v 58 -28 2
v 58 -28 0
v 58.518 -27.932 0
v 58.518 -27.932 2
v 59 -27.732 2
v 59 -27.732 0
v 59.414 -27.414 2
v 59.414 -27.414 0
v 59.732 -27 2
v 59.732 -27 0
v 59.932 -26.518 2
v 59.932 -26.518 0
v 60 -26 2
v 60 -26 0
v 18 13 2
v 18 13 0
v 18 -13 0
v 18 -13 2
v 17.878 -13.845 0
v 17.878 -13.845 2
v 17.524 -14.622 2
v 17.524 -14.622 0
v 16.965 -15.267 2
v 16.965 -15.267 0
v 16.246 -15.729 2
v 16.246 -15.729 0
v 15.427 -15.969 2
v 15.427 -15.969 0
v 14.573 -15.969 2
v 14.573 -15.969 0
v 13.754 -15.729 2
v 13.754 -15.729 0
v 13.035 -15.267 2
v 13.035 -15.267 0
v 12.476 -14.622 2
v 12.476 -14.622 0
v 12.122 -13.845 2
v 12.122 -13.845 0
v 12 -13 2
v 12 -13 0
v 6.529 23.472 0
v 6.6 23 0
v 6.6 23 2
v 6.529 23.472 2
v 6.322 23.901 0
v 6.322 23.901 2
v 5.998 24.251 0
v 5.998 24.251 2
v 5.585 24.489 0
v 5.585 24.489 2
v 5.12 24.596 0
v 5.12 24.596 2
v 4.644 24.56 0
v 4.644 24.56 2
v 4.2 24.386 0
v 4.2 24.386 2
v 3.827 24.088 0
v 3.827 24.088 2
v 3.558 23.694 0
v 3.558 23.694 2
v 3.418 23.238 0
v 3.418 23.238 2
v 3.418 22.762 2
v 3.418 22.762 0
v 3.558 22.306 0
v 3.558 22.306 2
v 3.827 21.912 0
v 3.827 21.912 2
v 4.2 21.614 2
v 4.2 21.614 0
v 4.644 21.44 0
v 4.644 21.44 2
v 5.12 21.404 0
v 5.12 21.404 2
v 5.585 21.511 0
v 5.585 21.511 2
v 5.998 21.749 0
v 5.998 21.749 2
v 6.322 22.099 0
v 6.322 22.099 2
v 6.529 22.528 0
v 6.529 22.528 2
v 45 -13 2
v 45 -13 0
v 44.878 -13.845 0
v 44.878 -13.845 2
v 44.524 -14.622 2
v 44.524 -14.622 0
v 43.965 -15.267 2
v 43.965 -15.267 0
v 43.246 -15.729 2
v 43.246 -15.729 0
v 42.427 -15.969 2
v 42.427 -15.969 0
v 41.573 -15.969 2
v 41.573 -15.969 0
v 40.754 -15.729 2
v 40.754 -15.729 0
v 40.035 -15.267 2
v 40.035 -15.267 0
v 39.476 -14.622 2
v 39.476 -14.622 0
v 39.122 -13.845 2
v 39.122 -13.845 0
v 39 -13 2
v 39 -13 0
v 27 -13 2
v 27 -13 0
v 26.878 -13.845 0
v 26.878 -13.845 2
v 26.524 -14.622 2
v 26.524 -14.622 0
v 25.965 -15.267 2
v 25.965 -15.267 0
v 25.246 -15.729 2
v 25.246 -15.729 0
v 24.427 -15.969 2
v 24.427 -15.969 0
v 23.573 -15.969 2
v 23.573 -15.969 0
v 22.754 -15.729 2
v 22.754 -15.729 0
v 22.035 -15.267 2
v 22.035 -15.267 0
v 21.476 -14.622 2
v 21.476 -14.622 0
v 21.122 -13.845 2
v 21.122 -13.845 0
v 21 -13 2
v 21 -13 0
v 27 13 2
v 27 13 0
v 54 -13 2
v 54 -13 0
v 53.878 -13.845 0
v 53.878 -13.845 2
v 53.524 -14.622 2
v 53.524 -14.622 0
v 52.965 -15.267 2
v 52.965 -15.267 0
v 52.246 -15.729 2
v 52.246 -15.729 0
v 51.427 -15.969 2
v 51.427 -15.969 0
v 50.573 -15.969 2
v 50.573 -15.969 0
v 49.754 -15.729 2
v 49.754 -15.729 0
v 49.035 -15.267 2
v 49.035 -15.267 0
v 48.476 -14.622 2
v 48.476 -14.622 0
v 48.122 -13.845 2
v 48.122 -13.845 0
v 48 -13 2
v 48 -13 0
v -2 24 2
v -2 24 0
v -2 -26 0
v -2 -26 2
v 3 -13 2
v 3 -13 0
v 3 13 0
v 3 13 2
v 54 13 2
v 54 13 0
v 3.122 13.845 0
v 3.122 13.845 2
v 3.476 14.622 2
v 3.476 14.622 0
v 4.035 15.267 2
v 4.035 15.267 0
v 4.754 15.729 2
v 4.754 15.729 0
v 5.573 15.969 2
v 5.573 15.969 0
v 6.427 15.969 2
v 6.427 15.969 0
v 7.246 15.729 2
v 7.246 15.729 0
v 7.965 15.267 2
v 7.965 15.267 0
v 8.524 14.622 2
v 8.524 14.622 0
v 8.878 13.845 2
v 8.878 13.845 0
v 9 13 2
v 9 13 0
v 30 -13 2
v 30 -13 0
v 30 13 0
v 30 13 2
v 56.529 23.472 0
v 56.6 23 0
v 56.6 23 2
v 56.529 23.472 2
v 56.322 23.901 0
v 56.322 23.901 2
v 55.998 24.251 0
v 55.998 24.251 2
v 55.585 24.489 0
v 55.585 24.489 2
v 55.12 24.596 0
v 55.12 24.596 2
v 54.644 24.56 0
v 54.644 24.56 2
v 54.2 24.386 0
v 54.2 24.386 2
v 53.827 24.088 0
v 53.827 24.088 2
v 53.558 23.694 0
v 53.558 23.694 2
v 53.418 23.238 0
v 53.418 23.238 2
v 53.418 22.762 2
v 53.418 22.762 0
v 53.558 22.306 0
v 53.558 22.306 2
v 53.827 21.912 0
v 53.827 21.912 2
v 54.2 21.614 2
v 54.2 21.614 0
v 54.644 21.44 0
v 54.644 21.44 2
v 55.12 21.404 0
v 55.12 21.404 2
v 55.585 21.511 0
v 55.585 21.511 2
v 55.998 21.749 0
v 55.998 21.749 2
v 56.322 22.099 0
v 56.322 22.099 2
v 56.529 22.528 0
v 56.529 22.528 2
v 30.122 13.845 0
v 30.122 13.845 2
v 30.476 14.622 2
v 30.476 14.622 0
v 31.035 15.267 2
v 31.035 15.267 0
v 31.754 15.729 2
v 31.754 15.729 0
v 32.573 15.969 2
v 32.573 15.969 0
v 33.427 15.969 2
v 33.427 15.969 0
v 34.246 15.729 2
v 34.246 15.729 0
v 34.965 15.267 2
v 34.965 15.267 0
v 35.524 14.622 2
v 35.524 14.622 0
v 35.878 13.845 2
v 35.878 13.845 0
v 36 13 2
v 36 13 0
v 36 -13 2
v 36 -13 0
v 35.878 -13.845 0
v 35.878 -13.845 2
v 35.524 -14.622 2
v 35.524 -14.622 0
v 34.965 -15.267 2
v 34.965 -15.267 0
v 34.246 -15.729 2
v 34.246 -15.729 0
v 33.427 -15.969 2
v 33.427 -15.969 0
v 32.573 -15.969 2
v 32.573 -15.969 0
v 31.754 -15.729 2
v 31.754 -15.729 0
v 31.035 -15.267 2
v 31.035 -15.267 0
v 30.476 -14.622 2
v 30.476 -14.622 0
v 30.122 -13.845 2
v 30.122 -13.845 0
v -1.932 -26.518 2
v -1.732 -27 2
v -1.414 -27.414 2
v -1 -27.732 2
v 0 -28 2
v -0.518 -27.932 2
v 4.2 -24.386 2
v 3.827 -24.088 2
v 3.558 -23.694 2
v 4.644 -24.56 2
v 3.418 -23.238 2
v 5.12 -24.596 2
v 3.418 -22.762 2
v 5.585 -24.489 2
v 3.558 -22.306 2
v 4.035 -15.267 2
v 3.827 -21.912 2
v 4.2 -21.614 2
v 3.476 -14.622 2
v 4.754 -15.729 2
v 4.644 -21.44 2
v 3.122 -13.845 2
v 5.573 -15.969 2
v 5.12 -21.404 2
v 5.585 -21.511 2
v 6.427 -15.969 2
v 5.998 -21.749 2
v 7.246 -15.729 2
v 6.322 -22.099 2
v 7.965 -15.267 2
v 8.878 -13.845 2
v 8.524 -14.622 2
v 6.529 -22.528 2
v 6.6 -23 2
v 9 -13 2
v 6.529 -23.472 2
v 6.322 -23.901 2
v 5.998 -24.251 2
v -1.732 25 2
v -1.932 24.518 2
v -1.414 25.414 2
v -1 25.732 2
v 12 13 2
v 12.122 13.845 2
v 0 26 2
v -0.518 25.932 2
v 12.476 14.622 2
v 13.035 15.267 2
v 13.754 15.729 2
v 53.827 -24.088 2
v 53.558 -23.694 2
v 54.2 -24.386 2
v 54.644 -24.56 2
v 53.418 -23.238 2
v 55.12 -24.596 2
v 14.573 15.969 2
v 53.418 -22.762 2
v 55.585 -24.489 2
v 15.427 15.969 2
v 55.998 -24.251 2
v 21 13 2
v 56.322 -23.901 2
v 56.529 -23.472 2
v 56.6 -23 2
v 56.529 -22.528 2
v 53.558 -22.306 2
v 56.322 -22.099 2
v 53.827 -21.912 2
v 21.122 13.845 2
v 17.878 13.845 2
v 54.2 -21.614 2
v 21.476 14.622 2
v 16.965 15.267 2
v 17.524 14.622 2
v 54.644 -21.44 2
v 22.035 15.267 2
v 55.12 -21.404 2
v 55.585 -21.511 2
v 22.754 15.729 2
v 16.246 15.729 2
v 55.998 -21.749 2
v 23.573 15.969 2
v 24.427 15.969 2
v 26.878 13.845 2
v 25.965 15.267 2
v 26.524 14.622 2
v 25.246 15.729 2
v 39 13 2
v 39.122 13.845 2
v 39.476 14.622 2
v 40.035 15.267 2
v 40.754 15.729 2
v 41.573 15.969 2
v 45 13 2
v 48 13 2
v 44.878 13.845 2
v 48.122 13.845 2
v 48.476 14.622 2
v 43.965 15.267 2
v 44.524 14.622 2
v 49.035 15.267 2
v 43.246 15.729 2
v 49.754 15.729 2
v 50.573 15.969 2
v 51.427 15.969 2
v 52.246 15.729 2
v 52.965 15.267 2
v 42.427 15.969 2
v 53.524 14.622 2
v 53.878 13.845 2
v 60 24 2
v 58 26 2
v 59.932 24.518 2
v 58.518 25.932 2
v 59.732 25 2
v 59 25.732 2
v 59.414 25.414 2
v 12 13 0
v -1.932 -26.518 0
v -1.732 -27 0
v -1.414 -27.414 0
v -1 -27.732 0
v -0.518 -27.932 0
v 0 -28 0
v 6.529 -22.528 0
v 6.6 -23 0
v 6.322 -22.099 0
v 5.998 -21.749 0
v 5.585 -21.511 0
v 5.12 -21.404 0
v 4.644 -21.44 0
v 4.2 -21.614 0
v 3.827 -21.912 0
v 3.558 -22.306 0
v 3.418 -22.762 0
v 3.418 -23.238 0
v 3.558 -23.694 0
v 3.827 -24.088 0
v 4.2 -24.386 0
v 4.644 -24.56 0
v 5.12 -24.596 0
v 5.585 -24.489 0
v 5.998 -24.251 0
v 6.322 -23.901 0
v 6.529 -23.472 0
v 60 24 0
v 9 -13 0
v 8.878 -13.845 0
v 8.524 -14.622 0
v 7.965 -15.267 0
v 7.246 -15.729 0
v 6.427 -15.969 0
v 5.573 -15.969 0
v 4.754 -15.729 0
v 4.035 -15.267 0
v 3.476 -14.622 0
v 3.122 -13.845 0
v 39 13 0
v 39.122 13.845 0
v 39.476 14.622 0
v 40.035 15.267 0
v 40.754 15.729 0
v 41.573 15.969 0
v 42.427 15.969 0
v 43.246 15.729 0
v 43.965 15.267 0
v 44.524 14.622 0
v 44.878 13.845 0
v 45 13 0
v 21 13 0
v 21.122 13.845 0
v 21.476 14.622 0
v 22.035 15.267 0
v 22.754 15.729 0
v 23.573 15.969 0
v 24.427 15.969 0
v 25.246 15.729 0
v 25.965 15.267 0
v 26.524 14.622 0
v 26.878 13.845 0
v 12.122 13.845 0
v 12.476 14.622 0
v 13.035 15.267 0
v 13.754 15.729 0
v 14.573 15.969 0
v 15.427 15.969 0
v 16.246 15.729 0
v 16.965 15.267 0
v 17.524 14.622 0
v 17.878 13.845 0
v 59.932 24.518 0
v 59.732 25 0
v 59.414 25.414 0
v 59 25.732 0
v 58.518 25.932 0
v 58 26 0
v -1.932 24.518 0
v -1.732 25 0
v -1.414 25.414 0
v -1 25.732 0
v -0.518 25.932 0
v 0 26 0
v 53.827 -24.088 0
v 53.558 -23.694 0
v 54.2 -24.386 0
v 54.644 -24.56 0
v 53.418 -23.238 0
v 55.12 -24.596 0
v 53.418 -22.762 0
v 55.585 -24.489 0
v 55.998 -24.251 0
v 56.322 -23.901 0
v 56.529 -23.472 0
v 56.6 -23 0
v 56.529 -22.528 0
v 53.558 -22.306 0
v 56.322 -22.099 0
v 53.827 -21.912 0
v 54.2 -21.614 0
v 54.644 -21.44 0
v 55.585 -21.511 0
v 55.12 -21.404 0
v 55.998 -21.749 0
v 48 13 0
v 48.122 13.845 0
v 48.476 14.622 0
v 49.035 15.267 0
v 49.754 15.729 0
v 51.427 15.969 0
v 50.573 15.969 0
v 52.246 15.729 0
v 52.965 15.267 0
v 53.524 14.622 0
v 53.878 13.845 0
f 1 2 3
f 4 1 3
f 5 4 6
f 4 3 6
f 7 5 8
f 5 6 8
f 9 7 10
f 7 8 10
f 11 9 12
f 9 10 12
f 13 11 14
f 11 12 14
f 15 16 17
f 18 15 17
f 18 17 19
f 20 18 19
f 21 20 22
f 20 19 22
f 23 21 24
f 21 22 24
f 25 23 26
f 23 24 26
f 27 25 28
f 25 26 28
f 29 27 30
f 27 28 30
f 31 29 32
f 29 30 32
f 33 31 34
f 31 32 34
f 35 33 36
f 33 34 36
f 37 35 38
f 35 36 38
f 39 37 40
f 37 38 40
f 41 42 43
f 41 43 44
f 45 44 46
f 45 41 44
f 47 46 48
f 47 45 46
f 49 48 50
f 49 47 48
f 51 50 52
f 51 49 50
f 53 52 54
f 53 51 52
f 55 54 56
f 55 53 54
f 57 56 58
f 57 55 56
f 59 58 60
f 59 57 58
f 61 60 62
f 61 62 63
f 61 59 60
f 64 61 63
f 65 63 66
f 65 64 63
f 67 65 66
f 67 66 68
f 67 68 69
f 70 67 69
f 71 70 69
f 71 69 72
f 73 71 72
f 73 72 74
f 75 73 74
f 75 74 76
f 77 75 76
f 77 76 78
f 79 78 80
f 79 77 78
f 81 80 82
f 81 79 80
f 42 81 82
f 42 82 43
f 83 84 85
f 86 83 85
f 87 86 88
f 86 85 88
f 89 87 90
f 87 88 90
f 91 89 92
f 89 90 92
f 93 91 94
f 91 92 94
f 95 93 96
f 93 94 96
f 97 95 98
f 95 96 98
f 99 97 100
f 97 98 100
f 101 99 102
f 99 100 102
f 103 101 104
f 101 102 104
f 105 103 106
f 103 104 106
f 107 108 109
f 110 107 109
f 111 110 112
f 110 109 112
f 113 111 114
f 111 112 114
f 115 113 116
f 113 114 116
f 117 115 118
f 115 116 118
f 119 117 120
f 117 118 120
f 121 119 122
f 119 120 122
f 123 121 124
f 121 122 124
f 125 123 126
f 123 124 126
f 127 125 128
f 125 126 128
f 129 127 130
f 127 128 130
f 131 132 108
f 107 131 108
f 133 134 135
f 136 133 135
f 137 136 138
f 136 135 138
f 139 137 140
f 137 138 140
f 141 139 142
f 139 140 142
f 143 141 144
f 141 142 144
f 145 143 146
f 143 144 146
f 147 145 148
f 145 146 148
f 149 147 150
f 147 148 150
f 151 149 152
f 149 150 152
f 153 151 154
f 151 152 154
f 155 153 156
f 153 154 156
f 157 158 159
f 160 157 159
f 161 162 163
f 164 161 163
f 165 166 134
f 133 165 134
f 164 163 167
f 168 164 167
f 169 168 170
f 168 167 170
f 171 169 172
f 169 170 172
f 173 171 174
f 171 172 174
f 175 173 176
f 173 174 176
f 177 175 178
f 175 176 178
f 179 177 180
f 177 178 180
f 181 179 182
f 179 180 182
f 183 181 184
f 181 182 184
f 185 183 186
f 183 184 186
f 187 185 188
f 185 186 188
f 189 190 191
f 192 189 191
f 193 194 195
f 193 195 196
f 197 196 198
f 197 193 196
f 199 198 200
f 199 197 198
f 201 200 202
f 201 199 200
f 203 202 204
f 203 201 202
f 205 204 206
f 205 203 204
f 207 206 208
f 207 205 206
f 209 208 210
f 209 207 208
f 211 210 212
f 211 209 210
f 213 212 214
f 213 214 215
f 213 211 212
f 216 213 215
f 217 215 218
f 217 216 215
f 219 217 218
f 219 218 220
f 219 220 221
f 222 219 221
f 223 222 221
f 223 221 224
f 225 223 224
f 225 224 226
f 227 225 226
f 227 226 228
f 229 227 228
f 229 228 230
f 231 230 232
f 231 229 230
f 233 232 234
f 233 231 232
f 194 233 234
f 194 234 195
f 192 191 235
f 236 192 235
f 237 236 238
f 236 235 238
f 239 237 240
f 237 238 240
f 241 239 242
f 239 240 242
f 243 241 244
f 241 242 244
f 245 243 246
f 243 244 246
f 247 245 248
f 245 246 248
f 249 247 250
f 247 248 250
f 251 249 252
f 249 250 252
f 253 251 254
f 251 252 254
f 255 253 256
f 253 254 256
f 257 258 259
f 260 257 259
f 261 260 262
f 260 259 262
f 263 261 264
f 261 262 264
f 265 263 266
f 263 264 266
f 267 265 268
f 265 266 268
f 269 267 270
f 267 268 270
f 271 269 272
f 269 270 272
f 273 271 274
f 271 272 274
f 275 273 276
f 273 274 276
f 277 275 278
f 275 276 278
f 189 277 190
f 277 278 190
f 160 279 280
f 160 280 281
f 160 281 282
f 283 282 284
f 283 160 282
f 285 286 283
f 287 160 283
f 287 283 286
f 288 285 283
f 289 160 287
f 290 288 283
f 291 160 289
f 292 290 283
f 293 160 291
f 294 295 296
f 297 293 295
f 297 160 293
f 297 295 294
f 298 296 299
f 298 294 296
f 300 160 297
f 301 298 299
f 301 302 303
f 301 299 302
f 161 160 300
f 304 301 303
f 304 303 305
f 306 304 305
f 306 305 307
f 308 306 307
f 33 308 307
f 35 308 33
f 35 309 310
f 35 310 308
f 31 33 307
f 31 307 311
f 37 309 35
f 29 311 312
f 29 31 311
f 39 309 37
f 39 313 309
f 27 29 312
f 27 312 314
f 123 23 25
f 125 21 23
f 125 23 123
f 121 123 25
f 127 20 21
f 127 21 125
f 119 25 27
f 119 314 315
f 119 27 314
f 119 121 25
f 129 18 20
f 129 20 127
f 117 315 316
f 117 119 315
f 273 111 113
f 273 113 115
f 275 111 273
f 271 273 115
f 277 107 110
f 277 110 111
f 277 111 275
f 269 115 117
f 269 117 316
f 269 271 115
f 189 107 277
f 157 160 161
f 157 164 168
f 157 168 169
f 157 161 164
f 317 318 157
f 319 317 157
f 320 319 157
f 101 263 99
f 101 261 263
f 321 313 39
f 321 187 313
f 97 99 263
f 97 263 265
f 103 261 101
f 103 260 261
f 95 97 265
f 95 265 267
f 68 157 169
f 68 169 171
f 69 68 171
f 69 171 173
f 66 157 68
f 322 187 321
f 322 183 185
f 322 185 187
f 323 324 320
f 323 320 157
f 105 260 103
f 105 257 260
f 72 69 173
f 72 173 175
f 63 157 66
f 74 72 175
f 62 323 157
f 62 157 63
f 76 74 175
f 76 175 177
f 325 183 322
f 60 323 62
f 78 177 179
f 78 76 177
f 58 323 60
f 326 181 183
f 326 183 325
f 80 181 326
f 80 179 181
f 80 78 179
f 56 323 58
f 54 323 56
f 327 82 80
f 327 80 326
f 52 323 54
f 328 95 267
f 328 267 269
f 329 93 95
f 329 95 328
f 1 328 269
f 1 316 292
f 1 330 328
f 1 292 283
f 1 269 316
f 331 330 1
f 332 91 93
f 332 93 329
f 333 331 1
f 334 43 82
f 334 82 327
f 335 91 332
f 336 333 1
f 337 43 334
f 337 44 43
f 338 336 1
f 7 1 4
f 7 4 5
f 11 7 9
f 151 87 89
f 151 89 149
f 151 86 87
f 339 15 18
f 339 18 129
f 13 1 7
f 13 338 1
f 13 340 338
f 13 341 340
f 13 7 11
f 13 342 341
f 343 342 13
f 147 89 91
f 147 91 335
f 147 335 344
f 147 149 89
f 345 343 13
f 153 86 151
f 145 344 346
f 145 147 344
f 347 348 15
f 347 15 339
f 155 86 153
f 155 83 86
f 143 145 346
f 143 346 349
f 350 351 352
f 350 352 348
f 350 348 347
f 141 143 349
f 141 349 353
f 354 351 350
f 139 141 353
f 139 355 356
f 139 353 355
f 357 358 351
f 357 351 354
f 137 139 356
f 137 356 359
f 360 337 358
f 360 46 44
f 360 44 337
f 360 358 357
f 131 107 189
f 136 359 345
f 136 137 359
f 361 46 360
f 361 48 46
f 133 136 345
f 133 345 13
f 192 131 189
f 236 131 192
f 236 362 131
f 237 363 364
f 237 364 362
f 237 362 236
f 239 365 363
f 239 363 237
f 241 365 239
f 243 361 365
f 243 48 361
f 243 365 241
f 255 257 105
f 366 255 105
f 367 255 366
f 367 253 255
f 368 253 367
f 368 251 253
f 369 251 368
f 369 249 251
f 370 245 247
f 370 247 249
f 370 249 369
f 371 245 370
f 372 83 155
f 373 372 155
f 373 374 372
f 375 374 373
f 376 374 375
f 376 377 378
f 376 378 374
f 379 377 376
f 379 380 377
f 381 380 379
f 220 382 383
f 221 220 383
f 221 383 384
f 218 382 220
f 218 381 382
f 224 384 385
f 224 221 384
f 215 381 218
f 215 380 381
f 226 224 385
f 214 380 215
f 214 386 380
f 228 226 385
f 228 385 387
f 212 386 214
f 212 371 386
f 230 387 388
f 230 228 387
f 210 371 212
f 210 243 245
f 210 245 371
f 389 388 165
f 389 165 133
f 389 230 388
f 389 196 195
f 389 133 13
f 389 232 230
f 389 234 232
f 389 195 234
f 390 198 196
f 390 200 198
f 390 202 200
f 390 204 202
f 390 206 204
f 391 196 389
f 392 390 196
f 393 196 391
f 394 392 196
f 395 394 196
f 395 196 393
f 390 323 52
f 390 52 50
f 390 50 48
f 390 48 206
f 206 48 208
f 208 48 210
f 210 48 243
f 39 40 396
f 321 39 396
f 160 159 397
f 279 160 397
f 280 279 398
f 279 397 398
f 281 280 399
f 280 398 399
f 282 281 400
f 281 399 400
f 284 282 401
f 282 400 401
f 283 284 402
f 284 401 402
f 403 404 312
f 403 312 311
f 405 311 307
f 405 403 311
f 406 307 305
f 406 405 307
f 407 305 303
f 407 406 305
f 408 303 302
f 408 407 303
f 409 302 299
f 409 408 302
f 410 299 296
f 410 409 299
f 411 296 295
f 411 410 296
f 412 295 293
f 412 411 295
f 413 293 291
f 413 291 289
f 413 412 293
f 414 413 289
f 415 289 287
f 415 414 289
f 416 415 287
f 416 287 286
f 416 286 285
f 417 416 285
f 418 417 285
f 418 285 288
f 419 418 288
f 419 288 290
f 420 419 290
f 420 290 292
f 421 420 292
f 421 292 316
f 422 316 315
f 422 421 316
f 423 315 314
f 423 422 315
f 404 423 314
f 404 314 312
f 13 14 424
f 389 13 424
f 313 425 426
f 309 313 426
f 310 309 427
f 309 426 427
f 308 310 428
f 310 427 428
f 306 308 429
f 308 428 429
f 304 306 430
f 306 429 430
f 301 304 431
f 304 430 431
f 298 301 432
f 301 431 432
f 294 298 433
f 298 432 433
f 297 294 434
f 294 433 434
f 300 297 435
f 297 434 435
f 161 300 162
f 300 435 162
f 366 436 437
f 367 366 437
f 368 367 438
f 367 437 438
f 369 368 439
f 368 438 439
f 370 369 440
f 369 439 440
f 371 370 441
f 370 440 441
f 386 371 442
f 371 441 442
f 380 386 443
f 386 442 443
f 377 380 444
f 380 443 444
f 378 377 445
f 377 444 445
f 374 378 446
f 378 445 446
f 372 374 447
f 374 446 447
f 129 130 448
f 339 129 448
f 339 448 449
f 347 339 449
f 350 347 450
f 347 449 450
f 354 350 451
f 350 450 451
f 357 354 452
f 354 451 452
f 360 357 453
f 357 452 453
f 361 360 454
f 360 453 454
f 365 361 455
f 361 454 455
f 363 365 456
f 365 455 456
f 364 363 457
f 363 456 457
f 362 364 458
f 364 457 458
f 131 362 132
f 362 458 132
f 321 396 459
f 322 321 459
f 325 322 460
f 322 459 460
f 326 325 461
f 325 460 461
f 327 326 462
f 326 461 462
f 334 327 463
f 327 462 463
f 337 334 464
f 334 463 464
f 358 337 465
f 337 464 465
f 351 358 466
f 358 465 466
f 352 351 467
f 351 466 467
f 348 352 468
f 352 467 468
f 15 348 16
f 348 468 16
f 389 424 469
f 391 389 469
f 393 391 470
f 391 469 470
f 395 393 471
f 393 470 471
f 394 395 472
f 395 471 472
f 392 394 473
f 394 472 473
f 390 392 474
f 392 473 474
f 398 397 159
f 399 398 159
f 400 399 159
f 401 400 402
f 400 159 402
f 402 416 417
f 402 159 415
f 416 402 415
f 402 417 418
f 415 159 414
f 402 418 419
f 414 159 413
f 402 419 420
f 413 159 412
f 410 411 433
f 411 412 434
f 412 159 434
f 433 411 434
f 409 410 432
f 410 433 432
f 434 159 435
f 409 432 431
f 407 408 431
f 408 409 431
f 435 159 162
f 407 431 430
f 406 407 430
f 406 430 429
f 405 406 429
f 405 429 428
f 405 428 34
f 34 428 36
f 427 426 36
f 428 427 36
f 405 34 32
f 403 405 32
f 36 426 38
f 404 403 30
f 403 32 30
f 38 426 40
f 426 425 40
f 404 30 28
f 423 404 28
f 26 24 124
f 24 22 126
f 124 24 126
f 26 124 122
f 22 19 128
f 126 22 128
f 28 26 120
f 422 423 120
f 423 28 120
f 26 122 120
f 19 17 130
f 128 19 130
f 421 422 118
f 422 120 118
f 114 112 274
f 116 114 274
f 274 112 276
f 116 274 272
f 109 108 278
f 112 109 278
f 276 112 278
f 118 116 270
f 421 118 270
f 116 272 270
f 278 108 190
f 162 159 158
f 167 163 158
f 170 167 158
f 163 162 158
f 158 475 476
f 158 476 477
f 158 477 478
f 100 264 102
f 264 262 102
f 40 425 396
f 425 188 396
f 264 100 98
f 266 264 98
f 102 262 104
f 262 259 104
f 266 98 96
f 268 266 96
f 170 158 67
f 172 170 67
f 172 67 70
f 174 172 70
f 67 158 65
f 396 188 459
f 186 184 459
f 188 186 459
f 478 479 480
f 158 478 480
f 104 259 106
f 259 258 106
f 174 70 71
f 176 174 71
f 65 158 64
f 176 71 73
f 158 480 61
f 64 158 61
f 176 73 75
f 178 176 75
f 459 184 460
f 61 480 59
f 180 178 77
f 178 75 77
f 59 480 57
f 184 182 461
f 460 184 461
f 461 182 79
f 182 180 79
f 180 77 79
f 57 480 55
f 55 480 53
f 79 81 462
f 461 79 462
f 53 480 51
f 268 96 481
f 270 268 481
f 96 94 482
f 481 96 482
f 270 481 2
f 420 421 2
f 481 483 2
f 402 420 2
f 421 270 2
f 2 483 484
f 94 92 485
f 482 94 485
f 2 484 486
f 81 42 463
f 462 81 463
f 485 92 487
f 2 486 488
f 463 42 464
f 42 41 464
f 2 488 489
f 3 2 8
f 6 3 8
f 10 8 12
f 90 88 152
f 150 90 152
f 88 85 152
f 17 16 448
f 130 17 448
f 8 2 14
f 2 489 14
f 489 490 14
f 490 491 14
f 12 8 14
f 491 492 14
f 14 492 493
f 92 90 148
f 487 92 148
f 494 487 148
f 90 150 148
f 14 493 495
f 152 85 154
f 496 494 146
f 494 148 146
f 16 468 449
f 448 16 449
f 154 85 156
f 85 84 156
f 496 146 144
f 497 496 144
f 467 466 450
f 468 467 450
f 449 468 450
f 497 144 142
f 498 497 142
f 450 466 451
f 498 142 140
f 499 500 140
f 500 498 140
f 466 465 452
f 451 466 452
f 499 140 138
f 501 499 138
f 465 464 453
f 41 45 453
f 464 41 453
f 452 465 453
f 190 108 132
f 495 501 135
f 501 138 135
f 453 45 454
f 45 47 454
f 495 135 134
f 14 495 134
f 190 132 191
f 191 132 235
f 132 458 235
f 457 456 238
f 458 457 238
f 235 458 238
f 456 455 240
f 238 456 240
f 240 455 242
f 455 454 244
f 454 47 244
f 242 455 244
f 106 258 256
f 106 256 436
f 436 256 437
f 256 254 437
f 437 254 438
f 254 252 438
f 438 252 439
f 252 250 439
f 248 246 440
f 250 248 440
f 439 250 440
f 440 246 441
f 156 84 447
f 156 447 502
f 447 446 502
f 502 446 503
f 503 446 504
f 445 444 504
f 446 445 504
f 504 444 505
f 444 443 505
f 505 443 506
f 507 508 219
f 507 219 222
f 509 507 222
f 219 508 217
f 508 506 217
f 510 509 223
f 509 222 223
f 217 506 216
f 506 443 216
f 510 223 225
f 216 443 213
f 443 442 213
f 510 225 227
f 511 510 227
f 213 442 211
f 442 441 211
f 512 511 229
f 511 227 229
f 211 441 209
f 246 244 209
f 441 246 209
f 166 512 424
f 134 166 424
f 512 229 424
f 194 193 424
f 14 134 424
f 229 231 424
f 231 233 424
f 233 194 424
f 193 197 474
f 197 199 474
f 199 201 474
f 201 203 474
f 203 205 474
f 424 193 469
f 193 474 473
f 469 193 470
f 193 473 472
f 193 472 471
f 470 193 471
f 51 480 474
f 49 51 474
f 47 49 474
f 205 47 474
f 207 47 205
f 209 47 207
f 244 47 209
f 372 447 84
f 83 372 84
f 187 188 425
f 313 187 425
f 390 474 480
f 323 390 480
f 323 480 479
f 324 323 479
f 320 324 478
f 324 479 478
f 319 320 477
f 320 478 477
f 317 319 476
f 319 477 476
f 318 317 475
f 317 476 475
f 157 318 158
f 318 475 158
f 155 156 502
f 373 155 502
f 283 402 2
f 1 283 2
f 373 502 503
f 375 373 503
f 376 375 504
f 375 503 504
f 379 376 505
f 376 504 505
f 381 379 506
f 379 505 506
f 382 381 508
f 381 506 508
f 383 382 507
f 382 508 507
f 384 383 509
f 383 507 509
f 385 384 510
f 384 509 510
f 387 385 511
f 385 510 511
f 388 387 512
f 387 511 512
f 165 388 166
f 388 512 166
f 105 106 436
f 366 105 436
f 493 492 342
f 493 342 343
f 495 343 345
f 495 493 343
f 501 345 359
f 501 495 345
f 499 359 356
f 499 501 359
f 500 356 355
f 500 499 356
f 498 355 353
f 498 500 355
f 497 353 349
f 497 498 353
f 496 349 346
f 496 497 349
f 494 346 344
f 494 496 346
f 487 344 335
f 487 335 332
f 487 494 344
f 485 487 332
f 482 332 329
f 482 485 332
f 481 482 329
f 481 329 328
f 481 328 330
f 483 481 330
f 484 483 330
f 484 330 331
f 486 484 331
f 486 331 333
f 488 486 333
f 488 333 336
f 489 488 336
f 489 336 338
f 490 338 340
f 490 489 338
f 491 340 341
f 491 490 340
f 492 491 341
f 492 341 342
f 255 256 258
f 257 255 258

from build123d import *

# Parameters (mm, degrees)
SKETCH_1_R      = 1.6
EXTRUDE_1_DEPTH = 2


with BuildPart() as part:
    # 草图1 → 凸台-拉伸1 (new body)
    with BuildSketch(Plane.XY):
        with BuildLine():
            Line((0, -28), (58, -28))
            ThreePointArc((58, -28), (59.414213562, -27.414213562), (60, -26))
            Line((60, -26), (60, 24))
            ThreePointArc((60, 24), (59.414213562, 25.414213562), (58, 26))
            Line((58, 26), (0, 26))
            ThreePointArc((0, 26), (-1.414213562, 25.414213562), (-2, 24))
            Line((-2, 24), (-2, -26))
            ThreePointArc((-2, -26), (-1.414213562, -27.414213562), (0, -28))
        make_face()
        with Locations((5, 23)):
            Circle(SKETCH_1_R, mode=Mode.SUBTRACT)
        with Locations((55, 23)):
            Circle(SKETCH_1_R, mode=Mode.SUBTRACT)
        with Locations((55, -23)):
            Circle(SKETCH_1_R, mode=Mode.SUBTRACT)
        with Locations((5, -23)):
            Circle(SKETCH_1_R, mode=Mode.SUBTRACT)
        with BuildLine():
            Line((9, 13), (9, -13))
            ThreePointArc((9, -13), (6, -16), (3, -13))
            Line((3, -13), (3, 13))
            ThreePointArc((3, 13), (6, 16), (9, 13))
        make_face(mode=Mode.SUBTRACT)
        with BuildLine():
            Line((18, 13), (18, -13))
            ThreePointArc((18, -13), (15, -16), (12, -13))
            Line((12, -13), (12, 13))
            ThreePointArc((12, 13), (15, 16), (18, 13))
        make_face(mode=Mode.SUBTRACT)
        with BuildLine():
            Line((27, 13), (27, -13))
            ThreePointArc((27, -13), (24, -16), (21, -13))
            Line((21, -13), (21, 13))
            ThreePointArc((21, 13), (24, 16), (27, 13))
        make_face(mode=Mode.SUBTRACT)
        with BuildLine():
            Line((36, 13), (36, -13))
            ThreePointArc((36, -13), (33, -16), (30, -13))
            Line((30, -13), (30, 13))
            ThreePointArc((30, 13), (33, 16), (36, 13))
        make_face(mode=Mode.SUBTRACT)
        with BuildLine():
            Line((45, 13), (45, -13))
            ThreePointArc((45, -13), (42, -16), (39, -13))
            Line((39, -13), (39, 13))
            ThreePointArc((39, 13), (42, 16), (45, 13))
        make_face(mode=Mode.SUBTRACT)
        with BuildLine():
            Line((54, 13), (54, -13))
            ThreePointArc((54, -13), (51, -16), (48, -13))
            Line((48, -13), (48, 13))
            ThreePointArc((48, 13), (51, 16), (54, 13))
        make_face(mode=Mode.SUBTRACT)
    extrude(amount=EXTRUDE_1_DEPTH)


solid = part.part
